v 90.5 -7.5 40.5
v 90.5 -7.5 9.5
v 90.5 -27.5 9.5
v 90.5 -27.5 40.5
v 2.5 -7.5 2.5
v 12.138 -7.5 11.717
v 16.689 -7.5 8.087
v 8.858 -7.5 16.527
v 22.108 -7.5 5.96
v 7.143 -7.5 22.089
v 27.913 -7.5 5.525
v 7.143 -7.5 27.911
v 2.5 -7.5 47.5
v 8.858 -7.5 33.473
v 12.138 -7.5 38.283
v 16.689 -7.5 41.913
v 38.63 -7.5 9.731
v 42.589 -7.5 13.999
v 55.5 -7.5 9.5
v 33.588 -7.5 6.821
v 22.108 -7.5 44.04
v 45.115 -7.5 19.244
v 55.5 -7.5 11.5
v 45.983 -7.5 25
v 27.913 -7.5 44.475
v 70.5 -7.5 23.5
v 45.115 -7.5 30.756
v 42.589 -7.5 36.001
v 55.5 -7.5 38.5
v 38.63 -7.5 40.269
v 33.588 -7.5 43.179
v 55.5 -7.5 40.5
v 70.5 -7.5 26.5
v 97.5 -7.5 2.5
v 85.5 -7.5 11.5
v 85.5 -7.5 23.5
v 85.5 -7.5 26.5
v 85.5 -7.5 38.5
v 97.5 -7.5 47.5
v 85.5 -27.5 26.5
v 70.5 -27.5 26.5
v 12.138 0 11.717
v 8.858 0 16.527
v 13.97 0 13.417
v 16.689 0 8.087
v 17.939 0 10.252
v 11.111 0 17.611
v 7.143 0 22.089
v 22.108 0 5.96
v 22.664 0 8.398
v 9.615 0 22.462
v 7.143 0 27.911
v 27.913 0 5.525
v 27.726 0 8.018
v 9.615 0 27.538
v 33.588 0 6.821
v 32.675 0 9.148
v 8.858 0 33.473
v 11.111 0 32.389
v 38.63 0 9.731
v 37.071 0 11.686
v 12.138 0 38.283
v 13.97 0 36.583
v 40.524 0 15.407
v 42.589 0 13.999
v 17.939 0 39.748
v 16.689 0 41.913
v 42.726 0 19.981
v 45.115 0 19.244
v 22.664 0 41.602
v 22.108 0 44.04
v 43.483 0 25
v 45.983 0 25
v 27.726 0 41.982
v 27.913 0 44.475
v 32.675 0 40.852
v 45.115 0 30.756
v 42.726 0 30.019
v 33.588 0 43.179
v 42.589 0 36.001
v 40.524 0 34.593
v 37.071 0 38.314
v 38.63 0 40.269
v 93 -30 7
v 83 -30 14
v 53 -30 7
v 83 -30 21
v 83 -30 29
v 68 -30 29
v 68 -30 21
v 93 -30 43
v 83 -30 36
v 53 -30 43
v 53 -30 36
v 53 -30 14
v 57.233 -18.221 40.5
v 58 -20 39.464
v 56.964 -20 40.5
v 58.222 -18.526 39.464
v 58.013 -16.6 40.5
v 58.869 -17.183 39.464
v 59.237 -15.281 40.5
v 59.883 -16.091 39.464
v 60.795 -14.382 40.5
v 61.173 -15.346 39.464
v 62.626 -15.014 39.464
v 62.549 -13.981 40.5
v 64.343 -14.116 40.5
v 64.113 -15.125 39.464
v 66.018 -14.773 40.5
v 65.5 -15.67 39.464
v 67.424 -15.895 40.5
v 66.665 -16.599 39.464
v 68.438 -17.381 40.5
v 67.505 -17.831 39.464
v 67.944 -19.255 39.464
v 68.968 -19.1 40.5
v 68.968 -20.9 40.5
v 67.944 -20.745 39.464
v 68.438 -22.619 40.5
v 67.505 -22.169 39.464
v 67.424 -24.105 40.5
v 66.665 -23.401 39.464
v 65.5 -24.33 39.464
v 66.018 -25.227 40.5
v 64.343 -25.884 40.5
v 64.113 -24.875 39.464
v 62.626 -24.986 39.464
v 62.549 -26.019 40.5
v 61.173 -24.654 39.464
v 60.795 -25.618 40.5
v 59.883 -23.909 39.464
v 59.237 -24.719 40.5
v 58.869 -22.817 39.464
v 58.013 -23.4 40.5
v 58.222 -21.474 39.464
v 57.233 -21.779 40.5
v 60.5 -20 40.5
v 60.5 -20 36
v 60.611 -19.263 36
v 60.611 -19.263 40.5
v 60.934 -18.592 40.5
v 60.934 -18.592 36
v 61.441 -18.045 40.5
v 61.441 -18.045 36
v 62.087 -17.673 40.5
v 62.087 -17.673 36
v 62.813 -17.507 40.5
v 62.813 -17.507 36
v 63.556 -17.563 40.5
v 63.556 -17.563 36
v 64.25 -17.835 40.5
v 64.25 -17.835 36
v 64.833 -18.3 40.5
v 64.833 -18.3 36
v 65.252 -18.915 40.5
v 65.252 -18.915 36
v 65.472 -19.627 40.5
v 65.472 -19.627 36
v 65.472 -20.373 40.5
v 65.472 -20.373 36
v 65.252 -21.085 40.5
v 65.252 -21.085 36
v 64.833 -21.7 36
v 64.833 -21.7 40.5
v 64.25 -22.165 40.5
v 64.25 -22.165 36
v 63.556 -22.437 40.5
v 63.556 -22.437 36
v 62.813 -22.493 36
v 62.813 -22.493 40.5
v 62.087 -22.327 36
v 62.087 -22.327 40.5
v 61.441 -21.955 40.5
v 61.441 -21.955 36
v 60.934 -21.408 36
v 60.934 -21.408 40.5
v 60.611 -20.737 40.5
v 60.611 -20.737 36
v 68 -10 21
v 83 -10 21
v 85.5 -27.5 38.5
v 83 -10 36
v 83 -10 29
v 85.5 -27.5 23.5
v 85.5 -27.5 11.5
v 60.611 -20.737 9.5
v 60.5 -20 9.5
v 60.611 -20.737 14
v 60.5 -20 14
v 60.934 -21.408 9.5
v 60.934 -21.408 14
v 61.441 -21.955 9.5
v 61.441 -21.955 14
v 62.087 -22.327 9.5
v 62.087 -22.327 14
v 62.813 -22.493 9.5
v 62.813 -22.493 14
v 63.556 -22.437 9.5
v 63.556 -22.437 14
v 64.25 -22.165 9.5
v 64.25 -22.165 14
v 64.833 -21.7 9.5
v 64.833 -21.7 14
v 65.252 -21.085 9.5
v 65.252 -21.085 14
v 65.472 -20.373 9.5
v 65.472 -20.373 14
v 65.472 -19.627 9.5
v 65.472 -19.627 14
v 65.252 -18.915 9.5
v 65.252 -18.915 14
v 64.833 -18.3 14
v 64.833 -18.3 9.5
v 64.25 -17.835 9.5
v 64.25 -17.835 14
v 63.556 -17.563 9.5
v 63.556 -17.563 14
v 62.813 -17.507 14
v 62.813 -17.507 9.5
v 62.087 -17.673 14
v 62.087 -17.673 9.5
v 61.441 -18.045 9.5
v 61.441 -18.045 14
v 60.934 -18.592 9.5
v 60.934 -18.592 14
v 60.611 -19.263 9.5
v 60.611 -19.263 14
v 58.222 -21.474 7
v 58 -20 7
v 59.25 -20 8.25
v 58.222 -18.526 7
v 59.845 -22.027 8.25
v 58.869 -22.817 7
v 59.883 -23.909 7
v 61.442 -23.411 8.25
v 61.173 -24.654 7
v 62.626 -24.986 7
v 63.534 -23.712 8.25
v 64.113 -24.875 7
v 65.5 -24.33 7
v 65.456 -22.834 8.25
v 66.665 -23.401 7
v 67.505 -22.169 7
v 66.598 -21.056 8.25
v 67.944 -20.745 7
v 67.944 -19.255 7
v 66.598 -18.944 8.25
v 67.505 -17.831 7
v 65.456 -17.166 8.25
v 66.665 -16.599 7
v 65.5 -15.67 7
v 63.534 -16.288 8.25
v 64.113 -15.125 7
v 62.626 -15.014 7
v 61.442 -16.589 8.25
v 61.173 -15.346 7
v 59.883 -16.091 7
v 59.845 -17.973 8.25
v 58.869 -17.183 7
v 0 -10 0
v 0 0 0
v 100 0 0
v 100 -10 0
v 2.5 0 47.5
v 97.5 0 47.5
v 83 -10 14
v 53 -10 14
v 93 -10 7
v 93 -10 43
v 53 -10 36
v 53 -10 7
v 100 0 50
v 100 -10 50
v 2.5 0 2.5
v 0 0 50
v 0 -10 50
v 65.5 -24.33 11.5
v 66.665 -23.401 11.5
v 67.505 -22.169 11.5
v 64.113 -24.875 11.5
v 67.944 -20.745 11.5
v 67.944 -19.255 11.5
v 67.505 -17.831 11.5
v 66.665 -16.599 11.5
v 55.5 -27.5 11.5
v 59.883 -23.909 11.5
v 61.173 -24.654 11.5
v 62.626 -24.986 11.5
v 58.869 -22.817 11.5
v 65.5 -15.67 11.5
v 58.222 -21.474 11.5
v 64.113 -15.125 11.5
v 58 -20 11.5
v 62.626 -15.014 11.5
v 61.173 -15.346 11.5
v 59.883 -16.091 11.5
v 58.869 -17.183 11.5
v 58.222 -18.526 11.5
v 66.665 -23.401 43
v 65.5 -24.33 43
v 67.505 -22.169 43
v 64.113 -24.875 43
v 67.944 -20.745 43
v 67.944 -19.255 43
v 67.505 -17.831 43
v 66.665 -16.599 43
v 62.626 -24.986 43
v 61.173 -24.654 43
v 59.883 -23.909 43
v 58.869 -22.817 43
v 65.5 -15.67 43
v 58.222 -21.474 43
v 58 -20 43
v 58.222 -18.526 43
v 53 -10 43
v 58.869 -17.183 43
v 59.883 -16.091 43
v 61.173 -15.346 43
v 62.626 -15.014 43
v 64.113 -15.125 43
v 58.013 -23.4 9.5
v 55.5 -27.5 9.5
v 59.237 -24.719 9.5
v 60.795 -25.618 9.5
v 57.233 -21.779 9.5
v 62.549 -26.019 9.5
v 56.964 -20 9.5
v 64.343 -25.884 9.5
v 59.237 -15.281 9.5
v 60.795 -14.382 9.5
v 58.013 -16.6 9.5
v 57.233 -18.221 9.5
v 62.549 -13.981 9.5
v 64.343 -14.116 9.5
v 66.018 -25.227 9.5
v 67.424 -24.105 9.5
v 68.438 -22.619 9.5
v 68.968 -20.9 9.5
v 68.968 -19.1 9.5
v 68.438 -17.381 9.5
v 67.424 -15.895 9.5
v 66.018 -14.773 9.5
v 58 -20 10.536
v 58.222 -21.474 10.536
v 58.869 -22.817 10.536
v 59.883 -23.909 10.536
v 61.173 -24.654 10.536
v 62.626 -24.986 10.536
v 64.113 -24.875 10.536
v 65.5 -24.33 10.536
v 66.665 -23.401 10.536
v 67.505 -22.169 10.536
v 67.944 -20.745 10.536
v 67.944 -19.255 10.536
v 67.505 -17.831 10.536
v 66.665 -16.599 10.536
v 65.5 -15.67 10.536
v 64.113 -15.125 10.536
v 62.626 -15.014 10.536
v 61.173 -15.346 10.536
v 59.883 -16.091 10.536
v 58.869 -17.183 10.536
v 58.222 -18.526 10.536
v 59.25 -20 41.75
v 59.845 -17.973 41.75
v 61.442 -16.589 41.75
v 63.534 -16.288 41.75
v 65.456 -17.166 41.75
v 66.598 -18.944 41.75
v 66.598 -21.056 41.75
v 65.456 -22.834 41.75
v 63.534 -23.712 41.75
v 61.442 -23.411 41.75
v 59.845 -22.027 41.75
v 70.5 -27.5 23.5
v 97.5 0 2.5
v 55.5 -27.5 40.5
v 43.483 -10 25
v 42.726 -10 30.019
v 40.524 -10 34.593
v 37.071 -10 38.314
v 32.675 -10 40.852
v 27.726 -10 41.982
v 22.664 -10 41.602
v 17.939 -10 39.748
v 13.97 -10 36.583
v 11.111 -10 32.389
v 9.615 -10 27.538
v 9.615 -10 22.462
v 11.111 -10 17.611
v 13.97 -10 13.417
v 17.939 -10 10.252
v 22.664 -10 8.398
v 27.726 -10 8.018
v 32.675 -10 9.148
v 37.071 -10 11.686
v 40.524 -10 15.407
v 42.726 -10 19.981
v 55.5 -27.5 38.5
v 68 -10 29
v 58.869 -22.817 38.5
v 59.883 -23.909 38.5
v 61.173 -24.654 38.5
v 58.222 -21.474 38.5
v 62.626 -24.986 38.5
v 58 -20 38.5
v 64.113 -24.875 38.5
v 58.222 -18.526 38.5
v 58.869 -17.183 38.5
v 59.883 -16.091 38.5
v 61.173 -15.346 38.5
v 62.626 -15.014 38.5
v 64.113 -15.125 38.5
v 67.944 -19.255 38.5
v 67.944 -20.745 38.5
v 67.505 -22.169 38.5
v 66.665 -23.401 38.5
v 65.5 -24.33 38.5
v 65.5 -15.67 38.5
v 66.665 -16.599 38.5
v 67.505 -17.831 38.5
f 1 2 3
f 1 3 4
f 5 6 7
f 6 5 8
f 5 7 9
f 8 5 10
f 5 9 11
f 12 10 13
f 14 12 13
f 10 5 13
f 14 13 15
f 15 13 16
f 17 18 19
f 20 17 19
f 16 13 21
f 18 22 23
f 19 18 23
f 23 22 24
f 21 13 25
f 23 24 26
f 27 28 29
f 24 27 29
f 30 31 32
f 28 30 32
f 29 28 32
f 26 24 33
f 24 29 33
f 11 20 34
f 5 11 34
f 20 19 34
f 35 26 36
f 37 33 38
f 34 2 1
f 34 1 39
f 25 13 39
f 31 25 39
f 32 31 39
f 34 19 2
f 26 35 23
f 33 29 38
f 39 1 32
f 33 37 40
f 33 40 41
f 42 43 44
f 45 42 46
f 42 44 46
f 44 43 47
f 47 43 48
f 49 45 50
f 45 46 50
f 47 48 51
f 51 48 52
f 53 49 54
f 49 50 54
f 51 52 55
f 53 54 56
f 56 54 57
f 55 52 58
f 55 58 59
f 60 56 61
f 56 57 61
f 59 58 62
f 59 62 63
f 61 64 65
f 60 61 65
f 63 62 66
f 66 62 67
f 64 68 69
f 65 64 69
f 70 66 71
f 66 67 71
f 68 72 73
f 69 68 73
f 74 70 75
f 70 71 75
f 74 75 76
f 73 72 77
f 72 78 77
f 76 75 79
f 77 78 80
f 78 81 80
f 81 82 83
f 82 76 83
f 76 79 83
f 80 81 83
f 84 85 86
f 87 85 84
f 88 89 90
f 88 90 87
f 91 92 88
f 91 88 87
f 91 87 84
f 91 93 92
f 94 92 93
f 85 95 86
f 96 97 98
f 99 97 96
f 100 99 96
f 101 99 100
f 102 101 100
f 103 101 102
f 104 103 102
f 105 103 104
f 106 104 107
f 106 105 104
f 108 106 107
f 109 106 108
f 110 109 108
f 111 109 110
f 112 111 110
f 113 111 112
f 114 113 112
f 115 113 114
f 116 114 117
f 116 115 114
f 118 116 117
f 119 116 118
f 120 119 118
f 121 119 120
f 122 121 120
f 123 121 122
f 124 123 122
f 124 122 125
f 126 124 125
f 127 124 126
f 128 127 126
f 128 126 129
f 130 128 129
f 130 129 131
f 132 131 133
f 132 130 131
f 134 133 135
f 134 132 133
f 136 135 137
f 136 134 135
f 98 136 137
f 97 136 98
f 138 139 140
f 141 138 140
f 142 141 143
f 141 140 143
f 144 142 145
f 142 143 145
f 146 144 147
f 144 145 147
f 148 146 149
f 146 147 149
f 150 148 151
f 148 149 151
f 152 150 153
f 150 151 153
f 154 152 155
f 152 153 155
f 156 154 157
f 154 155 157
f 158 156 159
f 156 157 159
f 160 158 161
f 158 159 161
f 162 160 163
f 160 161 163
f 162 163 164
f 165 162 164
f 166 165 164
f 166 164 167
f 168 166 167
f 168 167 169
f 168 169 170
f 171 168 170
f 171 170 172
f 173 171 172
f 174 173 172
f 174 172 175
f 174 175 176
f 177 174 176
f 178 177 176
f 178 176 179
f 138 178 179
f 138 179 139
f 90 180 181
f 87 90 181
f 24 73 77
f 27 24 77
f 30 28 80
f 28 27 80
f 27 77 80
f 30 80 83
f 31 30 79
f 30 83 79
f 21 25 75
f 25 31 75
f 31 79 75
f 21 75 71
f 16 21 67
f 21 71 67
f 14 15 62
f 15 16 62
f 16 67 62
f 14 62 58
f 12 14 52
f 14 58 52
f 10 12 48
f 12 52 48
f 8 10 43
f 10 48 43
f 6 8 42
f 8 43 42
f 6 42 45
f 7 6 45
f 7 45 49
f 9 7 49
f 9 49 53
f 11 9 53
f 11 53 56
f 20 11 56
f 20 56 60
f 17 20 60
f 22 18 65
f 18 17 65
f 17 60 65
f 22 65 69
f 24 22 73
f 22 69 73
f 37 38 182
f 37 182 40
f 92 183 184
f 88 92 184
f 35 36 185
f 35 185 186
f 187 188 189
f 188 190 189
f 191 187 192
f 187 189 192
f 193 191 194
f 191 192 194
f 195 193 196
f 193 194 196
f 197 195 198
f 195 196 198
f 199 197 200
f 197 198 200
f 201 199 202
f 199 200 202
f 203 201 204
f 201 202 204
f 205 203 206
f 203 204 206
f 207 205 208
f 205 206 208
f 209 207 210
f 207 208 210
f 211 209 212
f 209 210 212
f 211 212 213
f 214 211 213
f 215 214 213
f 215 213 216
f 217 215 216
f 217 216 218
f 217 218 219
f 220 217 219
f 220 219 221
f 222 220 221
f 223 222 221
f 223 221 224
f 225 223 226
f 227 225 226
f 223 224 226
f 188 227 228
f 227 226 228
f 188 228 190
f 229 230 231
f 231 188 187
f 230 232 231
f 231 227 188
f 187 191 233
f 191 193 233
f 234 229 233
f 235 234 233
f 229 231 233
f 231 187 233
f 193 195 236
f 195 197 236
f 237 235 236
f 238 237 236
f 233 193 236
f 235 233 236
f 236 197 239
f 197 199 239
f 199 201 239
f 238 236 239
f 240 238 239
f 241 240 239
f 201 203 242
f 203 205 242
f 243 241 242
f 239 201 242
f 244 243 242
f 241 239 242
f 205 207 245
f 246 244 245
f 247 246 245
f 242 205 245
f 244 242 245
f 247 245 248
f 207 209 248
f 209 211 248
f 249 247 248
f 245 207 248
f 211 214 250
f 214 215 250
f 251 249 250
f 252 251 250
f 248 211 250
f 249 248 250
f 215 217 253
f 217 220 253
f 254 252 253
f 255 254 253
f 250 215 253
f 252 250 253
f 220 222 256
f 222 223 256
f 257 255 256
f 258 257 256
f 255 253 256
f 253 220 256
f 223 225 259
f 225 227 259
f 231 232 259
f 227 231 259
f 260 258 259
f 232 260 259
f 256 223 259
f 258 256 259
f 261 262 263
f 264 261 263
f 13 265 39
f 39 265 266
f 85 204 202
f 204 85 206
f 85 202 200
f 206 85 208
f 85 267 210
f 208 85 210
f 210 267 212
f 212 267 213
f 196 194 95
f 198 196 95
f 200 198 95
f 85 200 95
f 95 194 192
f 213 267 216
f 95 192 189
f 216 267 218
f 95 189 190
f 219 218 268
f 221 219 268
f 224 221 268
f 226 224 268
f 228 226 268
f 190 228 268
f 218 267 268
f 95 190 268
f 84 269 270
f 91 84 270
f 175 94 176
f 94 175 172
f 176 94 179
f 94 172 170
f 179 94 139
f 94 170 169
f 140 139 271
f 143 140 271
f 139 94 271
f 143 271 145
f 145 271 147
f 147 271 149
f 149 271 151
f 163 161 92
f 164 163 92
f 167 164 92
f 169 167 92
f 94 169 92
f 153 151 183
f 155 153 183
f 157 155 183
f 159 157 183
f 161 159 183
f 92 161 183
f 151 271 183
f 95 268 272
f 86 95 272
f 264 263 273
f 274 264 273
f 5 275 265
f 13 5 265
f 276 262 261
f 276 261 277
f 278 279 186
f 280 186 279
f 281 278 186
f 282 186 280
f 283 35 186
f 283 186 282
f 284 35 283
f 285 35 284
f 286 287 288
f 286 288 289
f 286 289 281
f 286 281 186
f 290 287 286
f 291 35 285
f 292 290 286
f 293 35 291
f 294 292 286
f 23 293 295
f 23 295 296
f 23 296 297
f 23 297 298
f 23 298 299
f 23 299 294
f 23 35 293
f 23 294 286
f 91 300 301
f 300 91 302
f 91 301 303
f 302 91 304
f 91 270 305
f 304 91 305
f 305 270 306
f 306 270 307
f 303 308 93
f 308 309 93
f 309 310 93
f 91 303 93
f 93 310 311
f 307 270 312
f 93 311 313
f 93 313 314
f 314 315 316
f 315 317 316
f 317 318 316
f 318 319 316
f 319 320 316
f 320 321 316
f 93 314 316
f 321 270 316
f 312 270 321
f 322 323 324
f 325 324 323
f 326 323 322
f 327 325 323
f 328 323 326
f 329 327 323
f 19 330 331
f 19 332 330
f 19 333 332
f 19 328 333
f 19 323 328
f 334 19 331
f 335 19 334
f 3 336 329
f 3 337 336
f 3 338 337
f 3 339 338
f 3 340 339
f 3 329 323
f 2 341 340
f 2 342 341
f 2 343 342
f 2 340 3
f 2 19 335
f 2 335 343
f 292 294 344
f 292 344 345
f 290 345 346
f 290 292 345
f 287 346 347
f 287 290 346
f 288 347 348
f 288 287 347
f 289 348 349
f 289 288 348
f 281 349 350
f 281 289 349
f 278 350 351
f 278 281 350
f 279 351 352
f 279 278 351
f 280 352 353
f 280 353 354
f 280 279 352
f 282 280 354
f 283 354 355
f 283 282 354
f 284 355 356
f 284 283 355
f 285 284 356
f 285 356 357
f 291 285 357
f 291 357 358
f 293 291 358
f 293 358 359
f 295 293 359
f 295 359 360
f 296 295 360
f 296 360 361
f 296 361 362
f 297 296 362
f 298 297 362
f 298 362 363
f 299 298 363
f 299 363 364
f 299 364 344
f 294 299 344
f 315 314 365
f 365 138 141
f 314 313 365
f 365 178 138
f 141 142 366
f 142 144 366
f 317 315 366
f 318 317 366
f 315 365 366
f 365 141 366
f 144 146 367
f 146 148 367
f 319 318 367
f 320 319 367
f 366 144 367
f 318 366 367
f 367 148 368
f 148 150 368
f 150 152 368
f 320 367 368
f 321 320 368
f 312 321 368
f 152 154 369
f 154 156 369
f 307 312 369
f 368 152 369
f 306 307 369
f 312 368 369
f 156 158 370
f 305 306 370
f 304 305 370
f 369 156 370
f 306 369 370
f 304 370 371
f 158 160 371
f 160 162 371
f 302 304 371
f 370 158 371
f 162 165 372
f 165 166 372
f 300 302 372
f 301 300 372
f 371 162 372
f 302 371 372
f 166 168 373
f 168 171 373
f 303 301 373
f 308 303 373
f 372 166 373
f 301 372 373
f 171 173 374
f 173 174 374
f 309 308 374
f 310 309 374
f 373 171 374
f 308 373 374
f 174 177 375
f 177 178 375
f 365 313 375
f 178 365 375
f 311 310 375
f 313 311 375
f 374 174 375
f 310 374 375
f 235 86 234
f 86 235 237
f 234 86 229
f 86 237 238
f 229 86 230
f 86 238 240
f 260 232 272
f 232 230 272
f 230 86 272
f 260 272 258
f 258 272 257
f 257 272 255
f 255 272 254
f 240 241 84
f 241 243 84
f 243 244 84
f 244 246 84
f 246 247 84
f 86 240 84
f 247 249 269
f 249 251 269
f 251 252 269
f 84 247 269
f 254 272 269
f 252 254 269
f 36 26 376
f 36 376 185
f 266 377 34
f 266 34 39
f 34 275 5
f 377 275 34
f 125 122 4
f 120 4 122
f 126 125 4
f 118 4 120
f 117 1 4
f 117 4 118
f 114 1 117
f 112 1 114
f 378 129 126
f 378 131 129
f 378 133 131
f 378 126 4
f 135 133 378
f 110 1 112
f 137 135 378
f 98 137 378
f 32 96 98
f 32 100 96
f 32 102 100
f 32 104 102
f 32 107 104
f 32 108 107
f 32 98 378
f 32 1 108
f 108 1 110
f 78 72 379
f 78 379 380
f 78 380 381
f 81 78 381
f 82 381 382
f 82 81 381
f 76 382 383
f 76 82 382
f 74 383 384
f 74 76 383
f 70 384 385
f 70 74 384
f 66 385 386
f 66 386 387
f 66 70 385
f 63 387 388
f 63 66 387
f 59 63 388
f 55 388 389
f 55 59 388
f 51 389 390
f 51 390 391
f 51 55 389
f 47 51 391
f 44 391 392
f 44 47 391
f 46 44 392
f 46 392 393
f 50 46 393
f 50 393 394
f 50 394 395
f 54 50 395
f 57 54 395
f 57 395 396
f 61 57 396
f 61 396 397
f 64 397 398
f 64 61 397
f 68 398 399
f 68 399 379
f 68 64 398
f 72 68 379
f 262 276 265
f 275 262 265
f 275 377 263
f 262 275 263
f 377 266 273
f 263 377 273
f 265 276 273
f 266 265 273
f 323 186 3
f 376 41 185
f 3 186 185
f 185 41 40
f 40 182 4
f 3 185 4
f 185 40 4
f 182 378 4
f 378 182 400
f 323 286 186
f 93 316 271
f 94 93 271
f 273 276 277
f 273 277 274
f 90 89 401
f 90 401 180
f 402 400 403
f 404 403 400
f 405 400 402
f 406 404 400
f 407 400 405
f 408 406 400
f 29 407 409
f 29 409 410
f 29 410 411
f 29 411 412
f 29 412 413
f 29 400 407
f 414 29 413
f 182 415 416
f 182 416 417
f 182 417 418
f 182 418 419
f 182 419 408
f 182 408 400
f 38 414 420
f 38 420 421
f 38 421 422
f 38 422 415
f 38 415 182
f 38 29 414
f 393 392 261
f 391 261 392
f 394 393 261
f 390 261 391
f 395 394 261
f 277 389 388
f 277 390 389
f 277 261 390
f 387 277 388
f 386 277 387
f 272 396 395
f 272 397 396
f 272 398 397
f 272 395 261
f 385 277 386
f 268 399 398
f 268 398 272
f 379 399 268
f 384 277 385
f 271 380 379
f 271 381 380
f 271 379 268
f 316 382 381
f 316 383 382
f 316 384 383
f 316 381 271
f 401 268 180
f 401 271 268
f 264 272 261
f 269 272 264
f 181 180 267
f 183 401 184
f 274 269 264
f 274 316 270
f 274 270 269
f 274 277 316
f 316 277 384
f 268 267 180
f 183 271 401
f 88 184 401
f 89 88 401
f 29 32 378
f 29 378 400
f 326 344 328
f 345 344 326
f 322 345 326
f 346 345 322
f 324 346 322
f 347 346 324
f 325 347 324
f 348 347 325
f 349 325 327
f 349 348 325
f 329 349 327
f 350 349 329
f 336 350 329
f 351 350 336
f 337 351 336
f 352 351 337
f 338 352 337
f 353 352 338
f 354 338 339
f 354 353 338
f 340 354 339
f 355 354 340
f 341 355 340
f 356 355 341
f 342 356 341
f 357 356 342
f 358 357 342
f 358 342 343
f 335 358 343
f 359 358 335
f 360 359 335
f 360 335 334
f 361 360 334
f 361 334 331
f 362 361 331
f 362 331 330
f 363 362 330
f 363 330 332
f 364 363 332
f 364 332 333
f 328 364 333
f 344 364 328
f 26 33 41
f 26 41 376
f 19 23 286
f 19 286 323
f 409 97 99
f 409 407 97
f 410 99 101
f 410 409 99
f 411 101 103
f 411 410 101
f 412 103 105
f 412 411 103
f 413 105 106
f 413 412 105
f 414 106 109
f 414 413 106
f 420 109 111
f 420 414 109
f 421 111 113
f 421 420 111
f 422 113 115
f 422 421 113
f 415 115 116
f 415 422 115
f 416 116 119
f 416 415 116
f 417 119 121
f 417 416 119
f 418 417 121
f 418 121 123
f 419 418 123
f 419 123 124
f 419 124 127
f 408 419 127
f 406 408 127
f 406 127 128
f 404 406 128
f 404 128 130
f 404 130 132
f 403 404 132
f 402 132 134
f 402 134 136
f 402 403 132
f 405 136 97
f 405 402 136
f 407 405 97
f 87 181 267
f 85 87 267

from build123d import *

# Parameters (mm, degrees)
F0_W           = 100
F0_H           = 50
F0_R           = 17.029171721
F1_DEPTH       = 10
F3_DEPTH       = 20
F5_D           = 5
F5_DEPTH       = 12
F5_CSINK_D     = 10
F5_CSINK_ANGLE = 90
F5_TIP         = 1.5021515476
F7_D           = 5
F7_CSINK_D     = 10
F7_CSINK_ANGLE = 90
F8_T           = -2.5


with BuildPart() as f1:
    # F0 (on Front) → F1 (new body)
    with BuildSketch(Plane.XZ):
        with Locations((50, 25)):
            Rectangle(F0_W, F0_H)
        with Locations((26.453634724, 25)):
            Circle(F0_R, mode=Mode.SUBTRACT)
    extrude(amount=F1_DEPTH)

    # F2 (on face) → F3 (join)
    with BuildSketch(Plane.XZ.offset(10)):
        Polygon((93, 43), (53, 43), (53, 36), (83, 36), (83, 29), (68, 29), (68, 21), (83, 21), (83, 14), (53, 14), (53, 7), (93, 7), align=None)
    extrude(amount=F3_DEPTH)

    # F5
    with Locations(Plane(origin=(0, 0, 7), x_dir=(1, 0, 0), z_dir=(0, 0, -1))):
        with Locations((63, 20)):
            CounterSinkHole(F5_D / 2, F5_CSINK_D / 2, depth=F5_DEPTH, counter_sink_angle=F5_CSINK_ANGLE)
            with Locations((0, 0, -(F5_DEPTH + F5_TIP / 2))):  # 118° drill point
                Cone(0, F5_D / 2, F5_TIP, mode=Mode.SUBTRACT)

    # F7 (through all)
    with Locations(Plane.XY.offset(43)):
        with Locations((63, -20)):
            CounterSinkHole(F7_D / 2, F7_CSINK_D / 2, counter_sink_angle=F7_CSINK_ANGLE)

    # F8
    f8_openings = [f1.faces().sort_by_distance(p)[0] for p in [
        (55.246236, 0, 25),
    ]]
    offset(amount=F8_T, openings=f8_openings, kind=Kind.INTERSECTION)


solid = f1.part
